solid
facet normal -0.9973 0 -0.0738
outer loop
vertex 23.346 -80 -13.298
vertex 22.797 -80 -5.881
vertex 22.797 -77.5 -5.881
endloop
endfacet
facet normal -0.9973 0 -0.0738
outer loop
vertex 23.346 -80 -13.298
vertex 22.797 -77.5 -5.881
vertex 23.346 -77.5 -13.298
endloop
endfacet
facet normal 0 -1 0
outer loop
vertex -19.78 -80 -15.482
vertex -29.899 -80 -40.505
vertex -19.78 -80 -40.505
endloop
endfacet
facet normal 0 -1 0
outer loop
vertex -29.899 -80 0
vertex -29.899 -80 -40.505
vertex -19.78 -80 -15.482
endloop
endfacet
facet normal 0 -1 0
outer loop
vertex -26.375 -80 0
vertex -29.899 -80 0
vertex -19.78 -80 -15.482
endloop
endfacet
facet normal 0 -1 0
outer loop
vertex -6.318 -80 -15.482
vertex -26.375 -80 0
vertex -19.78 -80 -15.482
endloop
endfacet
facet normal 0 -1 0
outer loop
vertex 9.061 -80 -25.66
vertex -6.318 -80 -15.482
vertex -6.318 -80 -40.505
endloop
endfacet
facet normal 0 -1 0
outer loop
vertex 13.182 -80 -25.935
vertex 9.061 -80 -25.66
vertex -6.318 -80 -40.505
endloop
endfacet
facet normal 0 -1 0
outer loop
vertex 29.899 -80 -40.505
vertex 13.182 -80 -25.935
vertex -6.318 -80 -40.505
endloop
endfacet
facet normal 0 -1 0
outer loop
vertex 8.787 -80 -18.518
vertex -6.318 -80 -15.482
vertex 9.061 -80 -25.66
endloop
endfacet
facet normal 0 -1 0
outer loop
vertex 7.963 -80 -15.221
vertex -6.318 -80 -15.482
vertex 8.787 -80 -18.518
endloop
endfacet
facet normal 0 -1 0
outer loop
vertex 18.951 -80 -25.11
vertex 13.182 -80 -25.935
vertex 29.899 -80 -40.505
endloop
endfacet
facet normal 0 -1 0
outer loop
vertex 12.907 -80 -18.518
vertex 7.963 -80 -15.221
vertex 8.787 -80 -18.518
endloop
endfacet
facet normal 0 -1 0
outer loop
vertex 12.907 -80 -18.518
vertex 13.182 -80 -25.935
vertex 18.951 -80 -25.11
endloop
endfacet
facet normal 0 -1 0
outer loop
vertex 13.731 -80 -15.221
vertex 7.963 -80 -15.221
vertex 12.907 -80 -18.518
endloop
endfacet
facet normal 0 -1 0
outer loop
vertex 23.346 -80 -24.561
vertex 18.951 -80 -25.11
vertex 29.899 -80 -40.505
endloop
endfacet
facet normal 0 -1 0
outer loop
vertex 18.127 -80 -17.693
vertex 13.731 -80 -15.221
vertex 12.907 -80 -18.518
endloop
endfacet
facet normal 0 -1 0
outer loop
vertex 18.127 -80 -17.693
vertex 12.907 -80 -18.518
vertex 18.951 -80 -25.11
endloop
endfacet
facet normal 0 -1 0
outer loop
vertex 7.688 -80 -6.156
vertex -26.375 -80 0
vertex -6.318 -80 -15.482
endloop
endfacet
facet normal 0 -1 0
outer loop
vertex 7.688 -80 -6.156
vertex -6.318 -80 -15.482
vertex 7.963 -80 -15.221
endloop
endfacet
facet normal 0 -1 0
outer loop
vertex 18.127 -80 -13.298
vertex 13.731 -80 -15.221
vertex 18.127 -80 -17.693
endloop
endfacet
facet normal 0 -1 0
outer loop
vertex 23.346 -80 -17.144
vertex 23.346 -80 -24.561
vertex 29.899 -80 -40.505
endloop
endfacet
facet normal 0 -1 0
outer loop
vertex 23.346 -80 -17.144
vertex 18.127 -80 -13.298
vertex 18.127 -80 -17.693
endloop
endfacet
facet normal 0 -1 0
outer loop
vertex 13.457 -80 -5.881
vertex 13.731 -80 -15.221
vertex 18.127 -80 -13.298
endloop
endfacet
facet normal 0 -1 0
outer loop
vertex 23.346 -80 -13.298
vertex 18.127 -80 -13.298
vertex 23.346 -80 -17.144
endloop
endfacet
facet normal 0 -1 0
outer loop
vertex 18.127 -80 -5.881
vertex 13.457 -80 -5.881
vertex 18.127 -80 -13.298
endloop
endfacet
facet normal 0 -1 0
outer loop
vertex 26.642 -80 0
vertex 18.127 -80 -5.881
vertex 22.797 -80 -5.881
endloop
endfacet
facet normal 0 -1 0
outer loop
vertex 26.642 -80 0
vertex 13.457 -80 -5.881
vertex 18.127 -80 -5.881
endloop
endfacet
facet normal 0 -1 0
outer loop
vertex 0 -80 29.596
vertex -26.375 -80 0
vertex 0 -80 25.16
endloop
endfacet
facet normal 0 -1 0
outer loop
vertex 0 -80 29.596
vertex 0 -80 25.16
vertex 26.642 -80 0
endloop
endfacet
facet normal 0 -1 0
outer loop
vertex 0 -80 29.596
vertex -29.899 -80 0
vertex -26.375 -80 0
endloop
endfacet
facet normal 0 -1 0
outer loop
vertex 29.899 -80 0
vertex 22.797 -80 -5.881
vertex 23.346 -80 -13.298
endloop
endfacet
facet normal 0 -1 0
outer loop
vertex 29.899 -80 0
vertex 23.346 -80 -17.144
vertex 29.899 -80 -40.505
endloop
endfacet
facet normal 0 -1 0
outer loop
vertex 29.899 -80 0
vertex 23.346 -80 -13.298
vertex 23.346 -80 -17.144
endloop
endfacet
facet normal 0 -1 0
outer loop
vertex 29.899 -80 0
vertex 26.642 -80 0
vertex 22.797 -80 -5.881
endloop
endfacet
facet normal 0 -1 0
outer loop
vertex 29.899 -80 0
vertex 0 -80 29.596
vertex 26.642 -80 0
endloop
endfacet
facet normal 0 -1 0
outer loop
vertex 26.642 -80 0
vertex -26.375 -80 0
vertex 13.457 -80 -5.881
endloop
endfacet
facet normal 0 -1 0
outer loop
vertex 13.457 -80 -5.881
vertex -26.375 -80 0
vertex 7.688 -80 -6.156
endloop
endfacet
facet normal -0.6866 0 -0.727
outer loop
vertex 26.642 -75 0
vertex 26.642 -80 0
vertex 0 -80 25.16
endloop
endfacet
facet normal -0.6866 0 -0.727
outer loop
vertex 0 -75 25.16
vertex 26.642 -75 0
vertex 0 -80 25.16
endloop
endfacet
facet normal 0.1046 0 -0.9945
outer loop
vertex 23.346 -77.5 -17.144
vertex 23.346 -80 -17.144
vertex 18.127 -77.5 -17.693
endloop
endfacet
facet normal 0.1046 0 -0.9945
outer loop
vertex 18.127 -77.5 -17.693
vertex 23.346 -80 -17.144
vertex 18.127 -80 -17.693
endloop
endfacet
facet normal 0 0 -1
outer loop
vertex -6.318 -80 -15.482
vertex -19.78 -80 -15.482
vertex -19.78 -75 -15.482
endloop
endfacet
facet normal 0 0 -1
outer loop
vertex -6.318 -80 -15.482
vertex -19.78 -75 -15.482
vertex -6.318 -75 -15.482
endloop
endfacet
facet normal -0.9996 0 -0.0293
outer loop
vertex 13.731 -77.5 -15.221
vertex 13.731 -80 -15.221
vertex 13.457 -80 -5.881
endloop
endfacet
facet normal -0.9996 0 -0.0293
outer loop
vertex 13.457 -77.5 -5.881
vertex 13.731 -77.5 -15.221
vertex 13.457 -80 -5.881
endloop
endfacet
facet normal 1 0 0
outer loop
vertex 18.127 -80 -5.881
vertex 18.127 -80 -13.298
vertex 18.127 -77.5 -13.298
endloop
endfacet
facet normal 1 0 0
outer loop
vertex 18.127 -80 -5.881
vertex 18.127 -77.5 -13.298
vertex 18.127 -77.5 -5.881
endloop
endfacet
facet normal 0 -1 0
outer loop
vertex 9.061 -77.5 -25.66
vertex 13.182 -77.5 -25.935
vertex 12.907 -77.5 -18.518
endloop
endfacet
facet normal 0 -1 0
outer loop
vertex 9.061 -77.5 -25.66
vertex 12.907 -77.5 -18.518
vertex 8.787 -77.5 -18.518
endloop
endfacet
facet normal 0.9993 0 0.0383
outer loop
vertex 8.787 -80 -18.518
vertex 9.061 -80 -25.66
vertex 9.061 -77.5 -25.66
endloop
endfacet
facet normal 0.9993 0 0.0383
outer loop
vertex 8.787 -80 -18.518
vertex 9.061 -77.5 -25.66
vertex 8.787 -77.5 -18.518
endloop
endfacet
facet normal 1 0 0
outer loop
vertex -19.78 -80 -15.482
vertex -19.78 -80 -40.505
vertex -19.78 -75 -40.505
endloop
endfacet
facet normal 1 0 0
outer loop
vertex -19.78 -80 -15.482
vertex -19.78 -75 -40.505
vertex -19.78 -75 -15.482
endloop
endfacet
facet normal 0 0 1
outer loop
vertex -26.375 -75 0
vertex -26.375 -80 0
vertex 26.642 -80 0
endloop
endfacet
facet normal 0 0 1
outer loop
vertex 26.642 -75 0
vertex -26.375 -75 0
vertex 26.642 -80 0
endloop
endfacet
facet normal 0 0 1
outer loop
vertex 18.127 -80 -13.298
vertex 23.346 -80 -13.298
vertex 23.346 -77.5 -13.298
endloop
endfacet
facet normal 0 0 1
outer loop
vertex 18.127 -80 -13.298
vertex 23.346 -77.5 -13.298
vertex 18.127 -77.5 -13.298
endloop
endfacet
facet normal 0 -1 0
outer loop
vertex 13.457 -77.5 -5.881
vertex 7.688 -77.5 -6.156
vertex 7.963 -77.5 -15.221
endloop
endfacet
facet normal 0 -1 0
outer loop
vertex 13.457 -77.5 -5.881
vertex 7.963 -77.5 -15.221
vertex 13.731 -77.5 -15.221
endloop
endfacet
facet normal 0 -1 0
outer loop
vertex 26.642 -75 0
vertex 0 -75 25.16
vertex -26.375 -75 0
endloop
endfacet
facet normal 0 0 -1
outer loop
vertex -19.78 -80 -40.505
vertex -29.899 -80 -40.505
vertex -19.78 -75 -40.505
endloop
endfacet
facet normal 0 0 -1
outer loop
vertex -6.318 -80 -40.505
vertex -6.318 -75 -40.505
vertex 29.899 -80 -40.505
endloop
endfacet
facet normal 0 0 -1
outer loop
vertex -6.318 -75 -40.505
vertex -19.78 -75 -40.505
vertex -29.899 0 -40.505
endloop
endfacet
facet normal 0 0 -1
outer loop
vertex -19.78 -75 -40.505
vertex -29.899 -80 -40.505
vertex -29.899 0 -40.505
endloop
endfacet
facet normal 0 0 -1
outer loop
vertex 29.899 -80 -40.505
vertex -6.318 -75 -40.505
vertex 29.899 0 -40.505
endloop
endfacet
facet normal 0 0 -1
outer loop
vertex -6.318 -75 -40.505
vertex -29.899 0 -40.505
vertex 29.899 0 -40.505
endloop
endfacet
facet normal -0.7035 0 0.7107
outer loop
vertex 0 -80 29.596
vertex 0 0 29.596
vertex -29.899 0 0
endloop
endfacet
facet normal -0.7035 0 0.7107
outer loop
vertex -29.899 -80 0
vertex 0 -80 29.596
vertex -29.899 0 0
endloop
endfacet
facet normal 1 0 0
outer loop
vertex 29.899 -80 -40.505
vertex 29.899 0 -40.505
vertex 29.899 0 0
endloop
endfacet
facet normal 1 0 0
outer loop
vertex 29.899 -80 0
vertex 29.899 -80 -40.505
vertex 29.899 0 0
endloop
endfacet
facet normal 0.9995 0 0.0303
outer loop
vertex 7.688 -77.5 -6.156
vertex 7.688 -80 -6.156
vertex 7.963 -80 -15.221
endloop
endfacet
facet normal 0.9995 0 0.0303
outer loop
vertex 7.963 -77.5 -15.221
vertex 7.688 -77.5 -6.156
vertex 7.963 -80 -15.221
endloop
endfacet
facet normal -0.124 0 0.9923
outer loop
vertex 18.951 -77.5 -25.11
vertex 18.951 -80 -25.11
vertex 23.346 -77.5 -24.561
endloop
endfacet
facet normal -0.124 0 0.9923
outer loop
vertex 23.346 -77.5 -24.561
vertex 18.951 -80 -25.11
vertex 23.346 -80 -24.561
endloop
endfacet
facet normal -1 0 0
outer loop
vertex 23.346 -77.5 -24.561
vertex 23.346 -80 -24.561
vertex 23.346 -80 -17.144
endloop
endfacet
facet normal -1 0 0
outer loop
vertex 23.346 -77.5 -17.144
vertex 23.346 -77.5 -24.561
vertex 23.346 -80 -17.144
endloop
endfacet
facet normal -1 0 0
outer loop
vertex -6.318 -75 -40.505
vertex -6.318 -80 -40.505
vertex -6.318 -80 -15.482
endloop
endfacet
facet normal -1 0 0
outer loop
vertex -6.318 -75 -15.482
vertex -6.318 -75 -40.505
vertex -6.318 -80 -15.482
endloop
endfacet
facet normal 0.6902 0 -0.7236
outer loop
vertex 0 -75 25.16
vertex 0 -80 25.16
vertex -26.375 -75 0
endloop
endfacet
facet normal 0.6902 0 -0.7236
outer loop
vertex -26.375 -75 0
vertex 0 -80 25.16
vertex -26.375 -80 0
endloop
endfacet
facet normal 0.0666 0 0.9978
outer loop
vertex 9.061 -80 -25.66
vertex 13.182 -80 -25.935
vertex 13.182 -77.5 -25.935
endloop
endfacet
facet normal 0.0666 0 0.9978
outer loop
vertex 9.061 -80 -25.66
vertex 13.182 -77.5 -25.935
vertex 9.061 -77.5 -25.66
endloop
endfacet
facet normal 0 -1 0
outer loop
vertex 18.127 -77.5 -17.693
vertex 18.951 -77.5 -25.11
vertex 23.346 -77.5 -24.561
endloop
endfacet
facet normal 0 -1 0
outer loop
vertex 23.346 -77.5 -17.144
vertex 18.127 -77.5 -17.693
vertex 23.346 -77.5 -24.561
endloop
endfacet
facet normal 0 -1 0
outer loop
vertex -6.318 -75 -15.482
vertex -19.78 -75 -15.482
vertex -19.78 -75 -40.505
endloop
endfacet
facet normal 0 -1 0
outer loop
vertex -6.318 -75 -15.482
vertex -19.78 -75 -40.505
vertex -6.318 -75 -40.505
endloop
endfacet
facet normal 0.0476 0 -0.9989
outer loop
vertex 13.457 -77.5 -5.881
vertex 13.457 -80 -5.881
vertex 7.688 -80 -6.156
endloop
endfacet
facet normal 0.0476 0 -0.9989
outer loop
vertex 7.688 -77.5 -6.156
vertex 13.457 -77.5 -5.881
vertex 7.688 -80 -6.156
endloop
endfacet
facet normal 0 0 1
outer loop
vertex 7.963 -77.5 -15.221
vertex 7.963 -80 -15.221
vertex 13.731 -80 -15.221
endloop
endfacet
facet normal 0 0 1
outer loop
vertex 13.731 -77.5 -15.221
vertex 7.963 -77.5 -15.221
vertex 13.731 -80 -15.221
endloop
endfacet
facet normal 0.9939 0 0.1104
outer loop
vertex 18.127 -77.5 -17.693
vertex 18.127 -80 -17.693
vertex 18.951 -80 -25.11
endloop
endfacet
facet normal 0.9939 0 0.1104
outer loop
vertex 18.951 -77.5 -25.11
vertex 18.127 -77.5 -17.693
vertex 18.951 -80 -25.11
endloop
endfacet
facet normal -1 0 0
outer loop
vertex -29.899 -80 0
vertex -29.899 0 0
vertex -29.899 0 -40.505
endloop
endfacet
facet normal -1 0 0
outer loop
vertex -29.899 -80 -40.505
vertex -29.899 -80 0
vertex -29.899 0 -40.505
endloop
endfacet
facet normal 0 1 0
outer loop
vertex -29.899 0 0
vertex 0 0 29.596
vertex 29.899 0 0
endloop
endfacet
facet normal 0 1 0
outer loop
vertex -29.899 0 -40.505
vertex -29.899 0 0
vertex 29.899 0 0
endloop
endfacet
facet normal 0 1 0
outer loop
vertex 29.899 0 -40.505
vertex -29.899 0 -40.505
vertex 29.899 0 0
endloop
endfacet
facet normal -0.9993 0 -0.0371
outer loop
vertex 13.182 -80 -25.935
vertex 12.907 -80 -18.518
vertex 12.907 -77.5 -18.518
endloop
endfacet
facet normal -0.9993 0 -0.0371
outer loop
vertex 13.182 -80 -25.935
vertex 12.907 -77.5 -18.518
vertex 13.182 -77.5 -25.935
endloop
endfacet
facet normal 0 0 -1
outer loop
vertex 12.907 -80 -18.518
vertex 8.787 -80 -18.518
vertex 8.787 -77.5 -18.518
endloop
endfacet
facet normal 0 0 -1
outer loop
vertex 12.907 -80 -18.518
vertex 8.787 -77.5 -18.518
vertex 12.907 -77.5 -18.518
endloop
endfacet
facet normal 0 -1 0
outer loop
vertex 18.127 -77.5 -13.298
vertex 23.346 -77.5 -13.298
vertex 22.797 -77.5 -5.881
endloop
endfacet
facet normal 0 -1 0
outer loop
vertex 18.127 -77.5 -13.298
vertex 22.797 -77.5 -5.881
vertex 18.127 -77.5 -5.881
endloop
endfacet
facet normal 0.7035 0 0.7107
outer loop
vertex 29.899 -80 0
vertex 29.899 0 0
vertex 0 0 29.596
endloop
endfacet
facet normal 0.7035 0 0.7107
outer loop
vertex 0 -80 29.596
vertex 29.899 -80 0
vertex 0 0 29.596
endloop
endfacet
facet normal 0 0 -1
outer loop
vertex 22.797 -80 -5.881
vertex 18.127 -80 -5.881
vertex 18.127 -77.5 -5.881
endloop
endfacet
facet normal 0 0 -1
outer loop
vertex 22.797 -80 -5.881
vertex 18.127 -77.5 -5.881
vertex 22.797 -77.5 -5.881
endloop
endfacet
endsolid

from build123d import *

# Parameters (mm, degrees)
PAD_DEPTH       = 80
SKETCH001_W     = 13.46115
SKETCH001_H     = 25.548716
POCKET_DEPTH    = 5
POCKET001_DEPTH = 5
POCKET002_DEPTH = 2.5
POCKET003_DEPTH = 2.5


with BuildPart() as part:
    # Sketch → Pad (new body)
    with BuildSketch(Plane.XZ):
        Polygon((0, 29.595964), (-29.898989, 0), (-29.898989, -40.505043), (29.898993, -40.505043), (29.898993, 0), align=None)
    extrude(amount=PAD_DEPTH)

    # Sketch001 (on Face7 of Pad) → Pocket (cut)
    with BuildSketch(Plane.XZ.offset(80)):
        with Locations((-13.049075, -28.256087)):
            Rectangle(SKETCH001_W, SKETCH001_H)
    extrude(amount=-POCKET_DEPTH, mode=Mode.SUBTRACT)

    # Sketch002 (on Face5 of Pocket) → Pocket001 (cut)
    with BuildSketch(Plane.XZ.offset(80)):
        Polygon((0, 25.160156), (-26.375223, 0), (26.642376, 0), align=None)
    extrude(amount=-POCKET001_DEPTH, mode=Mode.SUBTRACT)

    # Sketch004 (on Face5 of Pocket001) → Pocket002 (cut)
    with BuildSketch(Plane.XZ.offset(80)):
        Polygon((23.345951, -13.298216), (18.126602, -13.298216), (18.126602, -5.881243), (22.796553, -5.881243), align=None)
        Polygon((8.786701, -18.517565), (12.907252, -18.517565), (13.181961, -25.934531), (9.061434, -25.659827), align=None)
        Polygon((18.126602, -17.693453), (18.950702, -25.110434), (23.345937, -24.561026), (23.345937, -17.144047), align=None)
    extrude(amount=-POCKET002_DEPTH, mode=Mode.SUBTRACT)

    # Sketch003 (on Face5 of Pocket001) → Pocket003 (cut)
    with BuildSketch(Plane.XZ.offset(80)):
        Polygon((7.687895, -6.155951), (7.962603, -15.221137), (13.731359, -15.221137), (13.456652, -5.881243), align=None)
    extrude(amount=-POCKET003_DEPTH, mode=Mode.SUBTRACT)


solid = part.part
